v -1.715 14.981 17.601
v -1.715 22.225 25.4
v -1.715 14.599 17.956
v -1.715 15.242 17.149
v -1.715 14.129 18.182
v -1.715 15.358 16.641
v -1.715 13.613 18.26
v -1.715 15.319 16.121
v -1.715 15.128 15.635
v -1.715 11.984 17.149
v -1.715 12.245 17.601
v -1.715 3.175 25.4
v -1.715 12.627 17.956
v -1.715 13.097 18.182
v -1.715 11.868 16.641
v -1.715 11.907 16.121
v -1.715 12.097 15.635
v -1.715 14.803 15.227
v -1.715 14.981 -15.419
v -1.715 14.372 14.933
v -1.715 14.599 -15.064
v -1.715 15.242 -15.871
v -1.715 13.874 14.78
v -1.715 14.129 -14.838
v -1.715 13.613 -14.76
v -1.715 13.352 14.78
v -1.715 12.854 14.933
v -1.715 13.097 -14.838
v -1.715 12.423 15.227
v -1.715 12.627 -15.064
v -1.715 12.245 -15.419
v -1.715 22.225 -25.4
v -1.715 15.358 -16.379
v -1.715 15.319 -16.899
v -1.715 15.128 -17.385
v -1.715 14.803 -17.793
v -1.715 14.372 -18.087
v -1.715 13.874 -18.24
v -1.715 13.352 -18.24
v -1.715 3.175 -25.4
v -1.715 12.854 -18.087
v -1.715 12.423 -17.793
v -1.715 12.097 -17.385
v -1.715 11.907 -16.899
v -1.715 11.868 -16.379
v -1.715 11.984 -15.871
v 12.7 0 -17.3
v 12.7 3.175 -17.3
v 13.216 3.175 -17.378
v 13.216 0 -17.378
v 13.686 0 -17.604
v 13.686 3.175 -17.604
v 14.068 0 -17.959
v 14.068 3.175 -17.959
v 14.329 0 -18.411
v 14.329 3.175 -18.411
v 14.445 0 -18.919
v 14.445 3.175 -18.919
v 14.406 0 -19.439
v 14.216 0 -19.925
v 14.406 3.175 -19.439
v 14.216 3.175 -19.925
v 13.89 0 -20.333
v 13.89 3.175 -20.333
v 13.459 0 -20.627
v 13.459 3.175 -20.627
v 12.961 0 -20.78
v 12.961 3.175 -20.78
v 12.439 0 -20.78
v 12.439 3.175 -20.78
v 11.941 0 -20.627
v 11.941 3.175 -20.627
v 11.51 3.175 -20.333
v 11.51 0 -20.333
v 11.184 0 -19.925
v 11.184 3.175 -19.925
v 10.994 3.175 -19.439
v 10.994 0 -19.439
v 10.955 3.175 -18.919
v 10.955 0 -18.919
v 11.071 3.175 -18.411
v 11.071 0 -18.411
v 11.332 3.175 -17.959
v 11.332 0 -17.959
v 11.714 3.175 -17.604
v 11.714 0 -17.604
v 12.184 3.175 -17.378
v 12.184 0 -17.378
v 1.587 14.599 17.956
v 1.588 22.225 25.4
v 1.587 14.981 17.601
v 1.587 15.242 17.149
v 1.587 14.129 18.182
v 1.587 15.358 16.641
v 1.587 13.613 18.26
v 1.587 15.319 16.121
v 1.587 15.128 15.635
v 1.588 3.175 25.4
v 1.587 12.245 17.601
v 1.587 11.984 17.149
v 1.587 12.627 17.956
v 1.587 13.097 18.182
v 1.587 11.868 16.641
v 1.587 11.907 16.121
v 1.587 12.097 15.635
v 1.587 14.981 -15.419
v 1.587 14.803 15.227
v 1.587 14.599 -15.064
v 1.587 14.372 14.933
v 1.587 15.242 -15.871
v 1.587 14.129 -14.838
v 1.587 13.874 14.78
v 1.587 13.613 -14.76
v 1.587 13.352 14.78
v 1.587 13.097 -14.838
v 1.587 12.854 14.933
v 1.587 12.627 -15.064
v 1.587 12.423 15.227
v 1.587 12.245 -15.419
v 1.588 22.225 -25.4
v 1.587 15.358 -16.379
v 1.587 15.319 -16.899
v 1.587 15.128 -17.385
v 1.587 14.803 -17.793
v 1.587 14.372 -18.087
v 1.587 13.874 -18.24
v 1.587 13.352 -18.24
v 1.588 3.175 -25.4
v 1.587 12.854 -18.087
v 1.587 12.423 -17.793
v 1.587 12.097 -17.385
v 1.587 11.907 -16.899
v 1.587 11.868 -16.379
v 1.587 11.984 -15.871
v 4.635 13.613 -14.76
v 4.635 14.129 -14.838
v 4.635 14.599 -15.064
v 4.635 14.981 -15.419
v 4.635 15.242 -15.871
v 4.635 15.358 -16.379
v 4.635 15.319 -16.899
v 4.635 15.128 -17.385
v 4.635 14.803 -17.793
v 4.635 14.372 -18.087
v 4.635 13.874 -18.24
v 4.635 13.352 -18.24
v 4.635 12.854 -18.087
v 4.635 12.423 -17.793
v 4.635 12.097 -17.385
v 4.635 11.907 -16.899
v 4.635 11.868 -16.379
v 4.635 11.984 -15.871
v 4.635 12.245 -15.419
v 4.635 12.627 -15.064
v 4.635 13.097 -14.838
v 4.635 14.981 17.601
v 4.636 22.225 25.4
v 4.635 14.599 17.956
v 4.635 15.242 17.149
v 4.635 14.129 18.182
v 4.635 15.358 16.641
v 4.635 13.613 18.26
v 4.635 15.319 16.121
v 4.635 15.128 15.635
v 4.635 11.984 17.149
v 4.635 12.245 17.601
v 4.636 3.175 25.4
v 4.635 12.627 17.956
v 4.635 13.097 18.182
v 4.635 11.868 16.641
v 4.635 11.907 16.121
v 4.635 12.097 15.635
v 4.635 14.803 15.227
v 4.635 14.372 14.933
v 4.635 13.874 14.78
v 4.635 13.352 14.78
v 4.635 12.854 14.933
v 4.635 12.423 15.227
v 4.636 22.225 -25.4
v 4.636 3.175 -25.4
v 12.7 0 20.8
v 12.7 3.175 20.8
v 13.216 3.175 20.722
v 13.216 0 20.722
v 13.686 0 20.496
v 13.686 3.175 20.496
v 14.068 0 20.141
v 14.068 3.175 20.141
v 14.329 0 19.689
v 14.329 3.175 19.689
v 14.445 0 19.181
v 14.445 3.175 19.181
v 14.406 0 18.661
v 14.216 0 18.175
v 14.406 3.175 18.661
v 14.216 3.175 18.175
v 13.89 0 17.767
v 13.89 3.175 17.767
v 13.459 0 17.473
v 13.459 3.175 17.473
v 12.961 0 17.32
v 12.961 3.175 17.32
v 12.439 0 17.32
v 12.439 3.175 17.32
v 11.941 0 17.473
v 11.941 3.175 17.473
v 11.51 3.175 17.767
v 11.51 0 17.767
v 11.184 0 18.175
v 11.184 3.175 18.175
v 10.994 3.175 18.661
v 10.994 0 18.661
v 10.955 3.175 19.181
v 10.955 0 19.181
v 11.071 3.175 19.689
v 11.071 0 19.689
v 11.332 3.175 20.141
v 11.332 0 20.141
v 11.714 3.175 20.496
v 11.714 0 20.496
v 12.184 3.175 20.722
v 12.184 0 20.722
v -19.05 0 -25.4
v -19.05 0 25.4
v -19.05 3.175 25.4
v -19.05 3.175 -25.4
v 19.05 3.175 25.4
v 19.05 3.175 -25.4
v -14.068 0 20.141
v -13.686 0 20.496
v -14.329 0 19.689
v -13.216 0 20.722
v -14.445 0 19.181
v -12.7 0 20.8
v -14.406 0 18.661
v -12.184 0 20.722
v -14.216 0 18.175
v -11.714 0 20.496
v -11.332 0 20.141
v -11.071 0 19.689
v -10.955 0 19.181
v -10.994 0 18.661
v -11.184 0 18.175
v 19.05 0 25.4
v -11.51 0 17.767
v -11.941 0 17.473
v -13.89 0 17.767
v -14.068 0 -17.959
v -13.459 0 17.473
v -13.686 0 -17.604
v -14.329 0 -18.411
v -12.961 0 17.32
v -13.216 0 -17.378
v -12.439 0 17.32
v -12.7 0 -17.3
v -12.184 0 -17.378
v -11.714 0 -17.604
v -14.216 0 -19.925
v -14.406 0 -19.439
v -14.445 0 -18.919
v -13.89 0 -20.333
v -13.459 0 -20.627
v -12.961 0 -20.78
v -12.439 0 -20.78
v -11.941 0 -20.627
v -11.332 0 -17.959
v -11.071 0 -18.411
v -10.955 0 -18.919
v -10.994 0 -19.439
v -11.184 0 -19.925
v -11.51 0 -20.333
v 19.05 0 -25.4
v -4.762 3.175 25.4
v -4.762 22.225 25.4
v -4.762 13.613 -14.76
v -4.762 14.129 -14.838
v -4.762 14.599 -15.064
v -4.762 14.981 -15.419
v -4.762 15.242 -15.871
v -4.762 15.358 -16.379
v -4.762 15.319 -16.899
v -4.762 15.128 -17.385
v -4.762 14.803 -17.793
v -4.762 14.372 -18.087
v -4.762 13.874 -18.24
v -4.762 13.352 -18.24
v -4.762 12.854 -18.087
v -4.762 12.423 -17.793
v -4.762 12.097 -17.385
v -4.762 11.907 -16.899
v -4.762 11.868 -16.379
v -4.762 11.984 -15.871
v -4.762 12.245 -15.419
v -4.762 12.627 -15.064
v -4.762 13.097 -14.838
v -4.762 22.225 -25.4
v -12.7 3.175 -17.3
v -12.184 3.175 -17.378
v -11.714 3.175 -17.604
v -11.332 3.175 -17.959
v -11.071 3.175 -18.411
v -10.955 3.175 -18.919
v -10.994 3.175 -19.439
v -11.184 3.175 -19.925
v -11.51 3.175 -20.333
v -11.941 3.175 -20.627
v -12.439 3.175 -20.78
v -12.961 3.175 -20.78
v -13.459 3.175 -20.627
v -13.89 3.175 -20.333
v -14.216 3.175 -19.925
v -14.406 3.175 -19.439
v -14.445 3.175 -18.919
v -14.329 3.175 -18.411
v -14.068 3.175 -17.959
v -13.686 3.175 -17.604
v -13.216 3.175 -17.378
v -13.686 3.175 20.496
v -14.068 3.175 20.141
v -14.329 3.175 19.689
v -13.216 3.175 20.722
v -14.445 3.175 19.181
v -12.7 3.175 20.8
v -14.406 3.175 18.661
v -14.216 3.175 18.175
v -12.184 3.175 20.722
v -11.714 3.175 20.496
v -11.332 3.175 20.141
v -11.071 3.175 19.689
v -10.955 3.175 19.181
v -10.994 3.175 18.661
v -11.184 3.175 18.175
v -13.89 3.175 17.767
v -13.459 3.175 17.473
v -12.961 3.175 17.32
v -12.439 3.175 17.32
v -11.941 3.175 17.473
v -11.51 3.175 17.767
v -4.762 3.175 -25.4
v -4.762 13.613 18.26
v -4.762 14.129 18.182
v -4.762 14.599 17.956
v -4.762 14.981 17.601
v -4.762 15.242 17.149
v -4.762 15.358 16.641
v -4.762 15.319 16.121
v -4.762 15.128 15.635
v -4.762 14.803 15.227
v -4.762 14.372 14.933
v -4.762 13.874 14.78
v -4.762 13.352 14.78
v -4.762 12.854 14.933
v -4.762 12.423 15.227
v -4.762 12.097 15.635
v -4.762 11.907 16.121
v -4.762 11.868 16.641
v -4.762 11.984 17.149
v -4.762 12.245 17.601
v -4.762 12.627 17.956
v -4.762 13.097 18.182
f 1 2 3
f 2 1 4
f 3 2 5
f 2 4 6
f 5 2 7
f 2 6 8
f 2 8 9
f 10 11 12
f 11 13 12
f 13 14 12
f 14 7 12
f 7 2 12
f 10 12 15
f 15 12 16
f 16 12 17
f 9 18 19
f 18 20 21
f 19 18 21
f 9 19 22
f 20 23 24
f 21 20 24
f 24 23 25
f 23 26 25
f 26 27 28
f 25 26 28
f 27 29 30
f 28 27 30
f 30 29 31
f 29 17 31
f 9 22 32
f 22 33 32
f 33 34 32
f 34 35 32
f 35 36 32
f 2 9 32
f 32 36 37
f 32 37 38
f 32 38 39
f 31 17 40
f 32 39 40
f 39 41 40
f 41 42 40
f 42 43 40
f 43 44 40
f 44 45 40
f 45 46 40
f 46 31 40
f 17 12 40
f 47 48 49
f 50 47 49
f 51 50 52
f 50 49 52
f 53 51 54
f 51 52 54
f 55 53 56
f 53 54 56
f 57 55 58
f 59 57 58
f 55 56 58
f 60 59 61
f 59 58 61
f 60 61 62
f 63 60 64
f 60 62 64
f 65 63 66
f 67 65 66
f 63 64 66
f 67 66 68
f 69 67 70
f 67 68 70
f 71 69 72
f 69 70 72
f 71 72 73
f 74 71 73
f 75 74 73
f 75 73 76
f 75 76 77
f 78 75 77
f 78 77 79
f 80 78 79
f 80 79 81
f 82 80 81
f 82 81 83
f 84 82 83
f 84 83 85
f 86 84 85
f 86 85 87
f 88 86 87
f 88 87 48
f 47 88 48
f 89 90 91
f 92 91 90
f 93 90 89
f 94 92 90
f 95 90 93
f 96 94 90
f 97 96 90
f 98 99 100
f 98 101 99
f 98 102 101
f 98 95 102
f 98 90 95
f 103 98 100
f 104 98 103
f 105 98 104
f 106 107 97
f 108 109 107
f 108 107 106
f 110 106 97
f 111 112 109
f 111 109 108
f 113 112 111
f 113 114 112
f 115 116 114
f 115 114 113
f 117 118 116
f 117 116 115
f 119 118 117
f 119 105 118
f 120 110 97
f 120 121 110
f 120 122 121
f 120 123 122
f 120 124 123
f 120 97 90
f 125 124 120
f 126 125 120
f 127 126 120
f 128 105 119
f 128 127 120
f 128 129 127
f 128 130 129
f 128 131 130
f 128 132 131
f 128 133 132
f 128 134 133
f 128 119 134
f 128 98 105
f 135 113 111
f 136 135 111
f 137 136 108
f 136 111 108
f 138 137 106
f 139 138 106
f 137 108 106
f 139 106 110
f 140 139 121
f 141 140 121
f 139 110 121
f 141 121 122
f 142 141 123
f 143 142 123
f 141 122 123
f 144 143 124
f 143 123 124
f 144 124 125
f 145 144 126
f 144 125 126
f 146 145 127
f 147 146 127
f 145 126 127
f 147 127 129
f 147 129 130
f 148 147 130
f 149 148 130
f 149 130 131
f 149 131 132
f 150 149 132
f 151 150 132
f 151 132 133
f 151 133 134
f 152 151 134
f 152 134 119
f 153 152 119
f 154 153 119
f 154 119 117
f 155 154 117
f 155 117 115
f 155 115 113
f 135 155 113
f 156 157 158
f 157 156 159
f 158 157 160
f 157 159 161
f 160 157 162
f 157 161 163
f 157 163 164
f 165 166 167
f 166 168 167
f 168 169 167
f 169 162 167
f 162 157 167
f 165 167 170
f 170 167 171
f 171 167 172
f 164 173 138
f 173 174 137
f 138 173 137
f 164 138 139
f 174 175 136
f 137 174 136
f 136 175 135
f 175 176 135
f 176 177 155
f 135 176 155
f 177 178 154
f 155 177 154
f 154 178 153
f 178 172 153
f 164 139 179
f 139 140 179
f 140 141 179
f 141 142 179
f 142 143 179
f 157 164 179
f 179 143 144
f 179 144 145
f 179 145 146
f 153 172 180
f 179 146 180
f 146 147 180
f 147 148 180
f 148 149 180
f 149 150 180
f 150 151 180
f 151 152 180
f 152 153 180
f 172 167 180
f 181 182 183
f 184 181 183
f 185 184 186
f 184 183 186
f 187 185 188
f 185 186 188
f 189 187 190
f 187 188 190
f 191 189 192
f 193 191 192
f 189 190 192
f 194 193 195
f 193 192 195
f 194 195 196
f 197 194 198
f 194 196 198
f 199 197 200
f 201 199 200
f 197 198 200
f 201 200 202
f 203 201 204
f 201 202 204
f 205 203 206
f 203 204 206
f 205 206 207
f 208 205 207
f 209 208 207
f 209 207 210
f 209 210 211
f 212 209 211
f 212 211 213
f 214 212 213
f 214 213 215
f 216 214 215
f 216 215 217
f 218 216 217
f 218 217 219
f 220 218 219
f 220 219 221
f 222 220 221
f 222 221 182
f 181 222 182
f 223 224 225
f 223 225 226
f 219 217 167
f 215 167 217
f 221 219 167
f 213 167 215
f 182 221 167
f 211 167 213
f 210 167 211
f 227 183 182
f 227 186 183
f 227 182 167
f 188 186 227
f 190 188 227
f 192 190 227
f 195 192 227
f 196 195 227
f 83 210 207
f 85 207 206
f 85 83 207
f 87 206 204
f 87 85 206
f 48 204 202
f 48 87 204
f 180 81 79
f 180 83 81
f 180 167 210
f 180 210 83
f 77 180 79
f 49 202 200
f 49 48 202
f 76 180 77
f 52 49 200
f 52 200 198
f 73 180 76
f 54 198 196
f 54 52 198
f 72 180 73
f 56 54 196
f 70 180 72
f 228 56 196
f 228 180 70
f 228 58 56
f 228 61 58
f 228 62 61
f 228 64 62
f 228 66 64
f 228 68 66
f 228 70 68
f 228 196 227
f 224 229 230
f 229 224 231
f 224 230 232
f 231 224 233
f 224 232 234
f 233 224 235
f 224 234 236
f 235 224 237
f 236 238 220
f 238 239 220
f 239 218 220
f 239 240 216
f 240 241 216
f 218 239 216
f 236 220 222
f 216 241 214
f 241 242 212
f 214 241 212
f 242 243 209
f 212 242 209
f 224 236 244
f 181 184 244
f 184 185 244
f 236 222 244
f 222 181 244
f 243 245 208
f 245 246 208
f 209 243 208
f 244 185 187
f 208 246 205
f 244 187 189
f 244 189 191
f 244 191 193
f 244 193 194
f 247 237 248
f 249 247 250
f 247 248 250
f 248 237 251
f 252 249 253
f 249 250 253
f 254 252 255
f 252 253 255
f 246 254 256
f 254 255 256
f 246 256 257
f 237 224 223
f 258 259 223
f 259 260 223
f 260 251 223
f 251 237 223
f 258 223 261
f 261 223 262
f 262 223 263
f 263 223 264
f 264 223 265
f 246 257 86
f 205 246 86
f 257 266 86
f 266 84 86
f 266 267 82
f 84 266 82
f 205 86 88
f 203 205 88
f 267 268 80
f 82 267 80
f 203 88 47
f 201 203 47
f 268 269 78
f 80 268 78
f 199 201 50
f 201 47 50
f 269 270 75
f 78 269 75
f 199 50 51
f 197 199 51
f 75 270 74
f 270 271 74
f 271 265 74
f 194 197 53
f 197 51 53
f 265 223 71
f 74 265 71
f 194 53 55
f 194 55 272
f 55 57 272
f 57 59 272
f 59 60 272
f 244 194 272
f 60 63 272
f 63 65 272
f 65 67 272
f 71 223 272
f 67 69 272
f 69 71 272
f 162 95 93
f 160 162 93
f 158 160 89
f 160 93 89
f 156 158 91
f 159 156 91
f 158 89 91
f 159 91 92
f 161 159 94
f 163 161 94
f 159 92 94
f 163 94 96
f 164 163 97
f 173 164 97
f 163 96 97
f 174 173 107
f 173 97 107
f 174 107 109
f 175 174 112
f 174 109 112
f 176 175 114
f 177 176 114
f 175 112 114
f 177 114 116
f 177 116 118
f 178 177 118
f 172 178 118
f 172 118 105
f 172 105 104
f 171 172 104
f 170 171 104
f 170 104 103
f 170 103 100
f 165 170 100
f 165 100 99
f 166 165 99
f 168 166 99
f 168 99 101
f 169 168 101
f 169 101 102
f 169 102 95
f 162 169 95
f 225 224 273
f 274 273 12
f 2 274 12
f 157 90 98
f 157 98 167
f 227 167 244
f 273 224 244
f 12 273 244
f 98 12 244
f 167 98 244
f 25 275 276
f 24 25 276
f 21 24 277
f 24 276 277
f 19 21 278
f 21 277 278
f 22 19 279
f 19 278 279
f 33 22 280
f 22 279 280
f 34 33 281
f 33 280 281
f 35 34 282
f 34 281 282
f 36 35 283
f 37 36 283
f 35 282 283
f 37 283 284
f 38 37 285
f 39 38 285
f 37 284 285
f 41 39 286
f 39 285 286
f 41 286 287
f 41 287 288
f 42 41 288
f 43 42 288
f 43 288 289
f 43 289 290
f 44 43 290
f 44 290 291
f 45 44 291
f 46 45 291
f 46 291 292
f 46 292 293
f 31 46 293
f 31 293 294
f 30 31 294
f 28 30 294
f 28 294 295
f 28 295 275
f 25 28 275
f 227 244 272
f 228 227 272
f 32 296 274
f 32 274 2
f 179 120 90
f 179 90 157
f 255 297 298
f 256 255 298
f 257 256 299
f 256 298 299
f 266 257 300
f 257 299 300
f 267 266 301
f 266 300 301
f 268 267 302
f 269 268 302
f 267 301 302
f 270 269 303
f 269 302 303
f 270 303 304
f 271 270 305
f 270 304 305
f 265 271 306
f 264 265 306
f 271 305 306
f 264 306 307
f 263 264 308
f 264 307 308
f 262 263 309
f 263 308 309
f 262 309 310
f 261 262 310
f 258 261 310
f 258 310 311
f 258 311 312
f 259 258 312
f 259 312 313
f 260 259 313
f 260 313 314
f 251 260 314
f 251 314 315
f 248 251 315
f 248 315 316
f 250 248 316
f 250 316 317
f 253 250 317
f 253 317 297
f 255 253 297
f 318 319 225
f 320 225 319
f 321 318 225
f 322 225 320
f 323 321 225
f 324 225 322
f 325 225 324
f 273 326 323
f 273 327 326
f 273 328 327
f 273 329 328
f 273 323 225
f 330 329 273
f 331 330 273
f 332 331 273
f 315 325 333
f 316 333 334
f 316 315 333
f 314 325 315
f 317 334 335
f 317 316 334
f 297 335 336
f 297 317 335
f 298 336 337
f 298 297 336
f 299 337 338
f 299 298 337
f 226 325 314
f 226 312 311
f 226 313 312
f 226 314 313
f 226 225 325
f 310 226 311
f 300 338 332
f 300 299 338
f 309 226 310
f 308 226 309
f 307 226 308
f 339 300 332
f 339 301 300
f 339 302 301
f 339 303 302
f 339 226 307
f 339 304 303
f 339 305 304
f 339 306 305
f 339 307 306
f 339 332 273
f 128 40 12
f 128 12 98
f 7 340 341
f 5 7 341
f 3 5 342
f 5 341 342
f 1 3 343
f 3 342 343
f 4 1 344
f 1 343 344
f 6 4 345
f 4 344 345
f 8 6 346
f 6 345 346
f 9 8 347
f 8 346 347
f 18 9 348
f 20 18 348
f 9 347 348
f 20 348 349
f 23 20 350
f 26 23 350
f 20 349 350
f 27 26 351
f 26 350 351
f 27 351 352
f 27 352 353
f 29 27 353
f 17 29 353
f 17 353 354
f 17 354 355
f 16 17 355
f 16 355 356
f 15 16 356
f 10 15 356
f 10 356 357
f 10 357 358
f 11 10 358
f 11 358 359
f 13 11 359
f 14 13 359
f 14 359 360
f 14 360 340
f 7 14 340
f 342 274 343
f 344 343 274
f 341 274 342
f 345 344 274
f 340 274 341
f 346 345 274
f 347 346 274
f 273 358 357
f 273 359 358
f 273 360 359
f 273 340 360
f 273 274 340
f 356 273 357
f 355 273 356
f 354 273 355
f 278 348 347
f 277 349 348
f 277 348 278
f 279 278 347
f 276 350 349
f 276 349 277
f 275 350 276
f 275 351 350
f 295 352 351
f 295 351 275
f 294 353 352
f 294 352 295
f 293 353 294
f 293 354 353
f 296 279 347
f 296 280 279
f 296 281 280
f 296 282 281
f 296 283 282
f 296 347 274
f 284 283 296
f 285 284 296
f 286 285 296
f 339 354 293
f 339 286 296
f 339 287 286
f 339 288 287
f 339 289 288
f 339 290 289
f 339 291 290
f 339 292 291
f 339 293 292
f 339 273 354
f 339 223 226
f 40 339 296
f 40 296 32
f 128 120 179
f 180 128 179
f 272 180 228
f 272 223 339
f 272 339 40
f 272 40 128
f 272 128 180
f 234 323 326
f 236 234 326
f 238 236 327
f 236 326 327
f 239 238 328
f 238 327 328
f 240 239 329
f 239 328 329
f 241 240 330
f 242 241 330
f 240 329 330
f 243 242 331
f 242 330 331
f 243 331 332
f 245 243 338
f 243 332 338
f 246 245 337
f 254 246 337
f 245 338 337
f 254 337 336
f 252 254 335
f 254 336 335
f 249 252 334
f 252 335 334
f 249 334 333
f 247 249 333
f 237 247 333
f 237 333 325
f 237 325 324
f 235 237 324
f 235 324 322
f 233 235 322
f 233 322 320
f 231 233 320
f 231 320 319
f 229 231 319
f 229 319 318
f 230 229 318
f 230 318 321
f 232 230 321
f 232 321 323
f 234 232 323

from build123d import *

# Parameters (mm, degrees)
SKETCH1_W           = 38.1
SKETCH1_H           = 50.8
BOSS_EXTRUDE1_DEPTH = 3.175
SKETCH2_W           = 3.048
SKETCH2_H           = 50.8
BOSS_EXTRUDE2_DEPTH = 19.05
SKETCH3_R           = 1.75
CUT_EXTRUDE1_DEPTH  = 38.026544532
SKETCH4_R           = 1.75
CUT_EXTRUDE2_DEPTH  = 42.305517564


with BuildPart() as part:
    # Sketch1 → Boss-Extrude1 (new body)
    with BuildSketch(Plane(origin=(0, 0, 0), x_dir=(1, 0, 0), z_dir=(0, 1, 0))):
        Rectangle(SKETCH1_W, SKETCH1_H)
    extrude(amount=BOSS_EXTRUDE1_DEPTH)

    # Sketch2 → Boss-Extrude2 (add)
    with BuildSketch(Plane(origin=(0, 3.175, 0), x_dir=(1, 0, 0), z_dir=(0, 1, 0))):
        with Locations((-3.2385, 0)):
            Rectangle(SKETCH2_W, SKETCH2_H)
        with Locations((3.1115, 0)):
            Rectangle(SKETCH2_W, SKETCH2_H)
    extrude(amount=BOSS_EXTRUDE2_DEPTH)

    # Sketch3 → Cut-Extrude1 (cut, through all)
    with BuildSketch(Plane(origin=(0, 3.175, 0), x_dir=(1, 0, 0), z_dir=(0, 1, 0))):
        with Locations(Location((-12.7, 19.05, 0), (0, 0, 270))):
            Circle(SKETCH3_R)
        with Locations(Location((-12.7, -19.05, 0), (0, 0, 270))):
            Circle(SKETCH3_R)
        with Locations(Location((12.7, -19.05, 0), (0, 0, 270))):
            Circle(SKETCH3_R)
        with Locations(Location((12.7, 19.05, 0), (0, 0, 270))):
            Circle(SKETCH3_R)
    extrude(amount=-CUT_EXTRUDE1_DEPTH, mode=Mode.SUBTRACT)

    # Sketch4 → Cut-Extrude2 (cut, through all)
    with BuildSketch(Plane.ZY.offset(4.7625)):
        with Locations((-16.51, 13.612832847)):
            Circle(SKETCH4_R)
        with Locations((16.51, 13.612832847)):
            Circle(SKETCH4_R)
    extrude(amount=-CUT_EXTRUDE2_DEPTH, mode=Mode.SUBTRACT)


solid = part.part
